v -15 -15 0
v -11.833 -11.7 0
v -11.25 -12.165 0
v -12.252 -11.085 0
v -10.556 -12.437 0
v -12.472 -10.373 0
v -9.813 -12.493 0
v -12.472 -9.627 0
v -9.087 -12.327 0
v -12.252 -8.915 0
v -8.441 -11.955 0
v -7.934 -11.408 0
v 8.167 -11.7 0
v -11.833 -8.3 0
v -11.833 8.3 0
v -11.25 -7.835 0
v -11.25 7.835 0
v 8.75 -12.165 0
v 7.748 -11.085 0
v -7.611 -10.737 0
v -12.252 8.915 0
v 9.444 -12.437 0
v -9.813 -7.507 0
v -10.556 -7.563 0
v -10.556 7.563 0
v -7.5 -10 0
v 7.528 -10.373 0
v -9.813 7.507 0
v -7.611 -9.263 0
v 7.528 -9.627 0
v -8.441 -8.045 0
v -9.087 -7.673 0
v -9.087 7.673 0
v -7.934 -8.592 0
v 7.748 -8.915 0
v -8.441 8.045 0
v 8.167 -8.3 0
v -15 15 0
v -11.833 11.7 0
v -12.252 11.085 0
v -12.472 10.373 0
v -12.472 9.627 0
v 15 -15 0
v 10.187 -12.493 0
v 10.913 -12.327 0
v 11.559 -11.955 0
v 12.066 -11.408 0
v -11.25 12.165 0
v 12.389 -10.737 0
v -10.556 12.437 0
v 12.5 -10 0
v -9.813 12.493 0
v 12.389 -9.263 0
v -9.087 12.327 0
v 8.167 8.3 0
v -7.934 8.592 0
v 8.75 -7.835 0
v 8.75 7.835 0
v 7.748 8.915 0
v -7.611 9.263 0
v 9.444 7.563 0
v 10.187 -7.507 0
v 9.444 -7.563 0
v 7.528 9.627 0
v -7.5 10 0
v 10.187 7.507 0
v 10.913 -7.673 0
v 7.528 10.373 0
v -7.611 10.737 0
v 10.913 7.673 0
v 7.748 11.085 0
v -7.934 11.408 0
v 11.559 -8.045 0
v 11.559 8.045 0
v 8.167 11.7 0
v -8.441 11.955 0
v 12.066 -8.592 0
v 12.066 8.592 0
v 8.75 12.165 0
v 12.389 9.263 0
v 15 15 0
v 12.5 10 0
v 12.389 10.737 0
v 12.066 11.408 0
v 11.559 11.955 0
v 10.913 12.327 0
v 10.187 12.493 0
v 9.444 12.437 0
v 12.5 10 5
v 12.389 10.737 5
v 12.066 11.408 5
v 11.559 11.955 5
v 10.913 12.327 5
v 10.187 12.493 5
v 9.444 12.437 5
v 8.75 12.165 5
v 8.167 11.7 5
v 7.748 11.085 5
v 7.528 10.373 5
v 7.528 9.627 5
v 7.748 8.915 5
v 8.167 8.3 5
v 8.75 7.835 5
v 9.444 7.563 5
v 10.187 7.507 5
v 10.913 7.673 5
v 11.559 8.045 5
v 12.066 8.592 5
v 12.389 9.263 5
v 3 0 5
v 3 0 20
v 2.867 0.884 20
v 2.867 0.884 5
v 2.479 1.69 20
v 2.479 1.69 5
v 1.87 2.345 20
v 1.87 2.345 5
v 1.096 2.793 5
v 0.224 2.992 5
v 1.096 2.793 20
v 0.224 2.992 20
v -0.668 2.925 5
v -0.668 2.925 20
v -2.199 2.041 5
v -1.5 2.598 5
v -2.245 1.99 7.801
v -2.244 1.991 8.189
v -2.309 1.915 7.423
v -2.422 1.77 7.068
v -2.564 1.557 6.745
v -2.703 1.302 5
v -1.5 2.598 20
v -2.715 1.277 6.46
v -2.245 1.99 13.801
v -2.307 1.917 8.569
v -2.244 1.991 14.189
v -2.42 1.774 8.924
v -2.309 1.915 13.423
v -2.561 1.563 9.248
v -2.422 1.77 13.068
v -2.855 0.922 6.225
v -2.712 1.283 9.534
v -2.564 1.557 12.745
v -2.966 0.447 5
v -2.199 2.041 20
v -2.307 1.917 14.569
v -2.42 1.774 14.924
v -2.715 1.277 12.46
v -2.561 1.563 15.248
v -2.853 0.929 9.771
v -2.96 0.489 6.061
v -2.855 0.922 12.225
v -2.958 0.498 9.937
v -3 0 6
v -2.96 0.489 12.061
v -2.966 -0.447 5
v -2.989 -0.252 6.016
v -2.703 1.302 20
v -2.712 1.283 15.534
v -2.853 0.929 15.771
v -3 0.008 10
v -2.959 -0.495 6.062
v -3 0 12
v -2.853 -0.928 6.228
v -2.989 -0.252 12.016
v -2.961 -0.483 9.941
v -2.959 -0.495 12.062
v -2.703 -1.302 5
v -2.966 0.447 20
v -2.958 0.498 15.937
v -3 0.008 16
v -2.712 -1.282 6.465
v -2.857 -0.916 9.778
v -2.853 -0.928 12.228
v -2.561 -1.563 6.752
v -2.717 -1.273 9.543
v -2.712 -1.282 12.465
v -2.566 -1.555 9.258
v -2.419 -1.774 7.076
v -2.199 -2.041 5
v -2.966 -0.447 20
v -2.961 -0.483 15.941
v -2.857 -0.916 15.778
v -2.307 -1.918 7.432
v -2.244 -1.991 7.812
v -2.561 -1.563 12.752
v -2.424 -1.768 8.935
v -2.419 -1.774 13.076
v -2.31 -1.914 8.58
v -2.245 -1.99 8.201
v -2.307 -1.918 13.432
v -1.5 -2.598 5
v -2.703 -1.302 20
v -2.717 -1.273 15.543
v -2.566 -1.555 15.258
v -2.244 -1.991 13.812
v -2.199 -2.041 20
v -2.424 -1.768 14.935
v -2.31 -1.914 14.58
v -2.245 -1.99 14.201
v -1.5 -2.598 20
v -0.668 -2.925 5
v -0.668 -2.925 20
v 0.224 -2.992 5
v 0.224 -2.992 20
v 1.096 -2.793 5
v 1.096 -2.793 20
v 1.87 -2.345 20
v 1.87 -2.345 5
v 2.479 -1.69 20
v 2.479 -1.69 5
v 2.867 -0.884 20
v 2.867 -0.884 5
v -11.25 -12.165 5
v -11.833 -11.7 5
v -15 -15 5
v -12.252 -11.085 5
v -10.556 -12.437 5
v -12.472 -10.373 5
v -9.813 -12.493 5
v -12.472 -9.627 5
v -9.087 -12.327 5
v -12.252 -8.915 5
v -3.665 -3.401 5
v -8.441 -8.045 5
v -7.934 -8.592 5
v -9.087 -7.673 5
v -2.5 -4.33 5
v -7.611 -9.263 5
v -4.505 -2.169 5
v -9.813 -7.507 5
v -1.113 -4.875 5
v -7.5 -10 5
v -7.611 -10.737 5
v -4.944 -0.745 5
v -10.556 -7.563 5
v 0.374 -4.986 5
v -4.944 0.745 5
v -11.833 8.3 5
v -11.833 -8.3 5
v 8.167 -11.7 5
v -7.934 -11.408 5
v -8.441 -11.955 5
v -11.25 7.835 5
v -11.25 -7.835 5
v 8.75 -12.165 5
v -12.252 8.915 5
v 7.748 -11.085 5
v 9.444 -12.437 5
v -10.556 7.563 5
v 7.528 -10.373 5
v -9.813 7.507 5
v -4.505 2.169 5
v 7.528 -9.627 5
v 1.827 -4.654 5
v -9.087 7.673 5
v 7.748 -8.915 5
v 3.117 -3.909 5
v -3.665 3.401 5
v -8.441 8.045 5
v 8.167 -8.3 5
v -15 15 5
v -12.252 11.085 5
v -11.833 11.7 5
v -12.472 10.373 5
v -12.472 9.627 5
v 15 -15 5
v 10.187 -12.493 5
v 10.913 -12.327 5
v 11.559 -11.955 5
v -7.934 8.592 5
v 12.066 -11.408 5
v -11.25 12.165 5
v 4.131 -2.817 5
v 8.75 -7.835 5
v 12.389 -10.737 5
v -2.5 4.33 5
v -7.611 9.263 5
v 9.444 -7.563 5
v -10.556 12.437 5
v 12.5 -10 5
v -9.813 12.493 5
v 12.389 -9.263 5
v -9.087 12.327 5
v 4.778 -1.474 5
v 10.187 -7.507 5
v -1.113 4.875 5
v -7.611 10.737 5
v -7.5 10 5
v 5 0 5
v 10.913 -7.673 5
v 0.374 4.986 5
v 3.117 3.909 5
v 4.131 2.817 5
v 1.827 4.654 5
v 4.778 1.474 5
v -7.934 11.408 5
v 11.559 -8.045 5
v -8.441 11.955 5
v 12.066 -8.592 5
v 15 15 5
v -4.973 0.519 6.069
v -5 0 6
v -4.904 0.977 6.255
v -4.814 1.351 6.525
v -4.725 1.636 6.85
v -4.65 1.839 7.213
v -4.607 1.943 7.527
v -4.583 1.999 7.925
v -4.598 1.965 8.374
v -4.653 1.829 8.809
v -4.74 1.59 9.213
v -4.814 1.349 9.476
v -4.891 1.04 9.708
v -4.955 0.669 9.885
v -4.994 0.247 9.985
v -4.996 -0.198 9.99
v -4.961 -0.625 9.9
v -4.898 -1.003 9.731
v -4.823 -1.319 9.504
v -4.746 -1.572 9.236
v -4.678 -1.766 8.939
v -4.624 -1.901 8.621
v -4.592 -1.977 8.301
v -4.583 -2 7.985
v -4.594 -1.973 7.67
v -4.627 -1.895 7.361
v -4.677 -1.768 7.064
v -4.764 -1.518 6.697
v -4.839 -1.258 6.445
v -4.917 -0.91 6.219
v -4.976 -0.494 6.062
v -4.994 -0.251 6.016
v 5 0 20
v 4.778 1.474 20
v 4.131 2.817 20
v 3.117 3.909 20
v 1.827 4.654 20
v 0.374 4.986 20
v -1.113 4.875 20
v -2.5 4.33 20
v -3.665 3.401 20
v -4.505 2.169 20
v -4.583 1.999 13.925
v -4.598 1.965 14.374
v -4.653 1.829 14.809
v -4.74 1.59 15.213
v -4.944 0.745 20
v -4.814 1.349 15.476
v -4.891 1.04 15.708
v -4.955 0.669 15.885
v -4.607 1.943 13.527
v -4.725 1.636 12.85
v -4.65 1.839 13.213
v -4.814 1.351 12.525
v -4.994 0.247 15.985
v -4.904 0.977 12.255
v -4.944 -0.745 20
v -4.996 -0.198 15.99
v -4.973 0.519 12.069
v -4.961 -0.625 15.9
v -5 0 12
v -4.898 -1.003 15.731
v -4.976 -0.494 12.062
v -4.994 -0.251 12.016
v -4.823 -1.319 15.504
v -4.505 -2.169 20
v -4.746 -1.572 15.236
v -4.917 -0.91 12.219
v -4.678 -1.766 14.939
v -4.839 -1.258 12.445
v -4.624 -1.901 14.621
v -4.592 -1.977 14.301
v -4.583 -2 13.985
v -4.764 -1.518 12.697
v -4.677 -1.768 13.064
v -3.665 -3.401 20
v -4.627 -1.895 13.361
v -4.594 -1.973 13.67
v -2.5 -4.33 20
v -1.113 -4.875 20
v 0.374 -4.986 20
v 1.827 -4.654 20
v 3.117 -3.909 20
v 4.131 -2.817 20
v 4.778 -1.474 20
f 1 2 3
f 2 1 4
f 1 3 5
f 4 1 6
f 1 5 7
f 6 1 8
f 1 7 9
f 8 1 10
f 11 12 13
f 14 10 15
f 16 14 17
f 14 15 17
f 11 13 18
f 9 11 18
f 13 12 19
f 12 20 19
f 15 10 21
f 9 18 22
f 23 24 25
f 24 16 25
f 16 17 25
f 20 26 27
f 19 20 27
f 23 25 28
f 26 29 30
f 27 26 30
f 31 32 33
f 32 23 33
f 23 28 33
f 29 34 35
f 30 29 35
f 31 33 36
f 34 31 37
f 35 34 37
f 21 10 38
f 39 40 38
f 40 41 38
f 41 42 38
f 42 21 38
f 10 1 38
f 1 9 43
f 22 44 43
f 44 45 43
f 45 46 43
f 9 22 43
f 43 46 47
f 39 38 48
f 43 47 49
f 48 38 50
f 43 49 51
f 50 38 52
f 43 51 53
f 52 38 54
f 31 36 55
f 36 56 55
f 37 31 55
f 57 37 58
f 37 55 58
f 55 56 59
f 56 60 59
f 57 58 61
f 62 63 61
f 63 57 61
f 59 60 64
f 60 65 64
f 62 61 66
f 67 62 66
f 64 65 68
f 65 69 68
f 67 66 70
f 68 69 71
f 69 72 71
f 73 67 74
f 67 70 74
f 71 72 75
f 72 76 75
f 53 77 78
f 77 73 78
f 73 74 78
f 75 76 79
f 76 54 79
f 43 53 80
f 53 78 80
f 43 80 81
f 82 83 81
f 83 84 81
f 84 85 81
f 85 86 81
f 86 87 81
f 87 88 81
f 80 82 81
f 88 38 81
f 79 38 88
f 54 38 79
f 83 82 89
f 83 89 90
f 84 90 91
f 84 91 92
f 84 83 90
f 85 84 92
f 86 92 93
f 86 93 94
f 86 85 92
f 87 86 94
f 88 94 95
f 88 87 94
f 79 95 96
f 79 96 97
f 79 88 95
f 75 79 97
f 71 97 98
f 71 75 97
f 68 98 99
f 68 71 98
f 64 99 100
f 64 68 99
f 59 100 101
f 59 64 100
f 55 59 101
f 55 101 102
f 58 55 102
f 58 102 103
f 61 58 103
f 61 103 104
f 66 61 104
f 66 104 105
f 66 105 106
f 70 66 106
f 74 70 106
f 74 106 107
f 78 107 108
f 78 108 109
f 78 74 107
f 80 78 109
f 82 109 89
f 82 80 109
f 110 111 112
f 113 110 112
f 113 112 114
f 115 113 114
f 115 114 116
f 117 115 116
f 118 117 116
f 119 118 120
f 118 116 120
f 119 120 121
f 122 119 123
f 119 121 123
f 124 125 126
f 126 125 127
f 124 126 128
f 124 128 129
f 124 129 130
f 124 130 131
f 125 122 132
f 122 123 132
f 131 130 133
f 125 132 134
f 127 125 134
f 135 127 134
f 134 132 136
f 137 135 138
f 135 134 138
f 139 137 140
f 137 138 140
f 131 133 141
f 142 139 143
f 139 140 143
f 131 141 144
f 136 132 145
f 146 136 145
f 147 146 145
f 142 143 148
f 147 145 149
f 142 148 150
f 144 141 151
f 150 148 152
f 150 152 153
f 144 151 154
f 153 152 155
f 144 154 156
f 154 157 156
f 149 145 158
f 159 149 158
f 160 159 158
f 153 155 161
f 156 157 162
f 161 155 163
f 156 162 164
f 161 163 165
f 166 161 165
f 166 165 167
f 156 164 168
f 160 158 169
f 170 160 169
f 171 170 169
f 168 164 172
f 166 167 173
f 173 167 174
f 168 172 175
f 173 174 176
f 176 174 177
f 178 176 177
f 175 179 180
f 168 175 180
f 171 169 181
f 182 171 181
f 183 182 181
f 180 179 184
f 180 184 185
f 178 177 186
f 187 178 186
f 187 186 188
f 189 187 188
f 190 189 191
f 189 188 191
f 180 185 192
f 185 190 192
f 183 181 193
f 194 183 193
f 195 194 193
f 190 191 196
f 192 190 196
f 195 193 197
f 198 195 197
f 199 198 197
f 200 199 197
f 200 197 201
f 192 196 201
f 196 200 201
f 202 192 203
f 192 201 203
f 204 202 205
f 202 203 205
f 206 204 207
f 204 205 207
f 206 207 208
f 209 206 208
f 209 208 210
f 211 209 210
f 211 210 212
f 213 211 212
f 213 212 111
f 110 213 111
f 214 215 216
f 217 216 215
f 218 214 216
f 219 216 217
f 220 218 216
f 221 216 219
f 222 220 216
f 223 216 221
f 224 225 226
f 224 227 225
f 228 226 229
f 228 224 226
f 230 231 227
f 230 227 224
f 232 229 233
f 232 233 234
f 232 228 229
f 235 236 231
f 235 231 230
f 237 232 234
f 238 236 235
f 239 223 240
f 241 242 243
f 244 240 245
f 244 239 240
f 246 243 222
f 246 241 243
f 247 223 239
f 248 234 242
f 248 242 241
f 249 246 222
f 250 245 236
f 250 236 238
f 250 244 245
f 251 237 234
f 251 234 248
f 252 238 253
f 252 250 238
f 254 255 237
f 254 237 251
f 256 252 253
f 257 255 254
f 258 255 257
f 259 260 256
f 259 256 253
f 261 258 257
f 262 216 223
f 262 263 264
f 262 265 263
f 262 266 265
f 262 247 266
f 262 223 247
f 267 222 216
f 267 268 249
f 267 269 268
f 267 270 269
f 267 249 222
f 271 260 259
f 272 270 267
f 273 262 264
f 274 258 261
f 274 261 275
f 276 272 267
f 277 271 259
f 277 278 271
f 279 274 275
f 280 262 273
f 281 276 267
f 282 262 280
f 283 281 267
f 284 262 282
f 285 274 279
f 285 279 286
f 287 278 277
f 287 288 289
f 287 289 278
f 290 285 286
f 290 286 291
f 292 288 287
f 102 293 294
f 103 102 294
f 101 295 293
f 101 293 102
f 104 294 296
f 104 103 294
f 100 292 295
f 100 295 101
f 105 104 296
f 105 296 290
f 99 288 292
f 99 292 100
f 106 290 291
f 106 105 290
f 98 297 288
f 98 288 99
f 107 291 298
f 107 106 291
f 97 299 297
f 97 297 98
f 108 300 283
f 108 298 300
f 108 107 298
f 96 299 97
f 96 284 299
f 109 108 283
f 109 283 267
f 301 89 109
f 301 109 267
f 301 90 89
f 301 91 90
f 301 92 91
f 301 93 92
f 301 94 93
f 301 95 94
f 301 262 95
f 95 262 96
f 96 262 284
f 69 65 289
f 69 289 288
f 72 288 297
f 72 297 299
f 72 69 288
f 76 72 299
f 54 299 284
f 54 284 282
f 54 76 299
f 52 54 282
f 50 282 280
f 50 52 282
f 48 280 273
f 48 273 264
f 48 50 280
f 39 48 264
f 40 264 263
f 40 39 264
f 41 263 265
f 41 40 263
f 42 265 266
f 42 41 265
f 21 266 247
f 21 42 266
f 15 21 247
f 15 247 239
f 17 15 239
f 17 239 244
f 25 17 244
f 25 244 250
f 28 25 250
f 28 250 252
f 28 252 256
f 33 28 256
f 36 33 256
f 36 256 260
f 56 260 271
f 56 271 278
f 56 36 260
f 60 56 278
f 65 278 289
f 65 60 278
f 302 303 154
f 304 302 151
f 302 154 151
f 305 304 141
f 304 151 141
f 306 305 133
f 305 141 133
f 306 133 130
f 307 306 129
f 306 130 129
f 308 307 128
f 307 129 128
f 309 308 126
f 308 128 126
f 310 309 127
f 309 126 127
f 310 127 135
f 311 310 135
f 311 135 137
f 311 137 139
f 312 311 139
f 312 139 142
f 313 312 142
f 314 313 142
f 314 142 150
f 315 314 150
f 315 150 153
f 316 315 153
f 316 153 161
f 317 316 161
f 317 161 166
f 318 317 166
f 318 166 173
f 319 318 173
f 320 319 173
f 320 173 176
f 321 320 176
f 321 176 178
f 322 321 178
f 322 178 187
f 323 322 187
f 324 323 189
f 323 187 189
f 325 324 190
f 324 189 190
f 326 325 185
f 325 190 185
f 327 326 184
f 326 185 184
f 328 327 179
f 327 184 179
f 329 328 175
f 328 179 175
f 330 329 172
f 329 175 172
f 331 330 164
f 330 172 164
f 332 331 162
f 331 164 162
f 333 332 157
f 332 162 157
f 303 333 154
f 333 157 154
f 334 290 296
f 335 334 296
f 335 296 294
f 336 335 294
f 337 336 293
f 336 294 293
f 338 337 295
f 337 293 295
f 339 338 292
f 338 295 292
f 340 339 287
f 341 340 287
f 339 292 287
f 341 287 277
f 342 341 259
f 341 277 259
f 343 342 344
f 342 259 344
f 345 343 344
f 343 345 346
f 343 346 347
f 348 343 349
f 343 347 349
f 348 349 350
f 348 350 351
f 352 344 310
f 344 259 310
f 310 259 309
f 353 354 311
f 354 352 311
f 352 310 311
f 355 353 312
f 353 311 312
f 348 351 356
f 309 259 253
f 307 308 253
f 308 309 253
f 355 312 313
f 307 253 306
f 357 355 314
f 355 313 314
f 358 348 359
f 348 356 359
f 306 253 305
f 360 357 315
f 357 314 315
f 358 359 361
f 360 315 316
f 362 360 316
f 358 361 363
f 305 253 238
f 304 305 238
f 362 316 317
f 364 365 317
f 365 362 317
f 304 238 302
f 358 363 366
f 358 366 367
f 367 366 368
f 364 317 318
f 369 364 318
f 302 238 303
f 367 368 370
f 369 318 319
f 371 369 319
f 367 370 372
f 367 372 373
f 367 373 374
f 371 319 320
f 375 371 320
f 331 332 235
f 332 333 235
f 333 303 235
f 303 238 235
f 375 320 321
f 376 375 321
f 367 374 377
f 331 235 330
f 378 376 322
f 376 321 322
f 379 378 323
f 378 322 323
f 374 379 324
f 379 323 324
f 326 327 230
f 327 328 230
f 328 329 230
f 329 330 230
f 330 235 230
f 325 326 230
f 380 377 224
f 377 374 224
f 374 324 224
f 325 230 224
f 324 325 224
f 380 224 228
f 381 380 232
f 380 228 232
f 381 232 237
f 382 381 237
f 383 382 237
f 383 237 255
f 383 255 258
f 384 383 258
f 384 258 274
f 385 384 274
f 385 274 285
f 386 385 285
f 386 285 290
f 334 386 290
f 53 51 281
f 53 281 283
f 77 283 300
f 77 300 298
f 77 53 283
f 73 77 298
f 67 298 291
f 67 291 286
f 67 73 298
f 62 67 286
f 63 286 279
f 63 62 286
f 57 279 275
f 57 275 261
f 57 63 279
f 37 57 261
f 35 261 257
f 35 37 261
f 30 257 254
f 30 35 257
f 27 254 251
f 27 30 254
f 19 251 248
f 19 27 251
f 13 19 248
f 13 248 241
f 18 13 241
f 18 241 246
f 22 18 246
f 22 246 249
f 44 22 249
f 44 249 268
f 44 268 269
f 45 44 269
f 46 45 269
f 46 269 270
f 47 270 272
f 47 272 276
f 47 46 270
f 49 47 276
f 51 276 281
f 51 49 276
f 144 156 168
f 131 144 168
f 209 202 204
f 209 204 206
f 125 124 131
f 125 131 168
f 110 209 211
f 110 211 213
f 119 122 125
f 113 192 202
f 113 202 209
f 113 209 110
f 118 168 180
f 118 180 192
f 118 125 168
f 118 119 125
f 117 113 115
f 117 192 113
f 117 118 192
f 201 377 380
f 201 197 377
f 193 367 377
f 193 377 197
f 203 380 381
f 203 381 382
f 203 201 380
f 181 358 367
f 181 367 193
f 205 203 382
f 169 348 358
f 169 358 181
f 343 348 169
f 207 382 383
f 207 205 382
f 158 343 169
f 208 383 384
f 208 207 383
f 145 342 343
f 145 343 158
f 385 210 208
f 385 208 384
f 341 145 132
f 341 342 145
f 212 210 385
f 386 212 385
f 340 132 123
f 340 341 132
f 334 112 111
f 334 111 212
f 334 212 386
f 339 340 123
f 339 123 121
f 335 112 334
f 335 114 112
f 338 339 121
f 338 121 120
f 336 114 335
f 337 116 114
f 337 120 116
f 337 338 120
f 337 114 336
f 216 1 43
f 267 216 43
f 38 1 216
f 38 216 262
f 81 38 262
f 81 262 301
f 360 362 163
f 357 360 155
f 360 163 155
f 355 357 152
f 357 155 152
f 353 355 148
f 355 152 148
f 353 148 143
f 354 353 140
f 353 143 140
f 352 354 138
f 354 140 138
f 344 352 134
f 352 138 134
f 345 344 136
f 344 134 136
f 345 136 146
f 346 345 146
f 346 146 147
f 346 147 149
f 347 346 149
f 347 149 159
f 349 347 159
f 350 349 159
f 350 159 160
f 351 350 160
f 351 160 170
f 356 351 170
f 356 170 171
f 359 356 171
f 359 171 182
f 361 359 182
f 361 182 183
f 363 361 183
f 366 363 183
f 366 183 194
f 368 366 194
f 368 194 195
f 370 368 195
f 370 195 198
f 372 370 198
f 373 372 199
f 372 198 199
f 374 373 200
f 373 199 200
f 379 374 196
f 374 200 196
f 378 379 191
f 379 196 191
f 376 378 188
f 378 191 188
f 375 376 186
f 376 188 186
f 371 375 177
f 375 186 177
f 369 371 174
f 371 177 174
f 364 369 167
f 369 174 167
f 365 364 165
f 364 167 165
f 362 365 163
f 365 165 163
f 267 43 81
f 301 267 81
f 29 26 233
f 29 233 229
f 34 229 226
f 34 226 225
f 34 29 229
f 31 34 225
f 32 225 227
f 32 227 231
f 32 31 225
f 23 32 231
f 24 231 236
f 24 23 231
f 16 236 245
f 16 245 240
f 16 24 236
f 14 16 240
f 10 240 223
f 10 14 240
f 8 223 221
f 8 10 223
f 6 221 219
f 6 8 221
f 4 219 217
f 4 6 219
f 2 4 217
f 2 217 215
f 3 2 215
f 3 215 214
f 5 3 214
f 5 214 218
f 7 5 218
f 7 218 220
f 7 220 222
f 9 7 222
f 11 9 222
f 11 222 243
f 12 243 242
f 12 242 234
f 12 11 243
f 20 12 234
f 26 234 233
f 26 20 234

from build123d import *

# Parameters (mm, degrees)
ESBO_O1_W                = 30
ESBO_O1_H                = 30
ESBO_O1_R                = 2.5
RESSALTO_EXTRUS_O1_DEPTH = 5
ESBO_O3_R                = 5
RESSALTO_EXTRUS_O2_DEPTH = 15
ESBO_O4_R                = 3
CORTE_EXTRUS_O1_DEPTH    = 15
ESBO_O5_R                = 2
CORTE_EXTRUS_O2_DEPTH    = 15


with BuildPart() as part:
    # Esboço1 → Ressalto-extrusão1 (new body)
    with BuildSketch(Plane.XY):
        Rectangle(ESBO_O1_W, ESBO_O1_H)
        with Locations((-10, 10)):
            Circle(ESBO_O1_R, mode=Mode.SUBTRACT)
        with Locations((10, 10)):
            Circle(ESBO_O1_R, mode=Mode.SUBTRACT)
        with Locations((10, -10)):
            Circle(ESBO_O1_R, mode=Mode.SUBTRACT)
        with Locations((-10, -10)):
            Circle(ESBO_O1_R, mode=Mode.SUBTRACT)
    extrude(amount=RESSALTO_EXTRUS_O1_DEPTH)

    # Esboço3 → Ressalto-extrusão2 (add)
    with BuildSketch(Plane.XY.offset(5)):
        Circle(ESBO_O3_R)
    extrude(amount=RESSALTO_EXTRUS_O2_DEPTH)

    # Esboço4 → Corte-extrusão1 (cut)
    with BuildSketch(Plane.XY.offset(20)):
        Circle(ESBO_O4_R)
    extrude(amount=-CORTE_EXTRUS_O1_DEPTH, mode=Mode.SUBTRACT)

    # Esboço5 → Corte-extrusão2 (cut)
    with BuildSketch(Plane(origin=(0, 0, 0), x_dir=(0, 0, -1), z_dir=(1, 0, 0))):
        with Locations((-8, 0)):
            Circle(ESBO_O5_R)
        with Locations((-14, 0)):
            Circle(ESBO_O5_R)
    extrude(amount=-CORTE_EXTRUS_O2_DEPTH, mode=Mode.SUBTRACT)


solid = part.part
